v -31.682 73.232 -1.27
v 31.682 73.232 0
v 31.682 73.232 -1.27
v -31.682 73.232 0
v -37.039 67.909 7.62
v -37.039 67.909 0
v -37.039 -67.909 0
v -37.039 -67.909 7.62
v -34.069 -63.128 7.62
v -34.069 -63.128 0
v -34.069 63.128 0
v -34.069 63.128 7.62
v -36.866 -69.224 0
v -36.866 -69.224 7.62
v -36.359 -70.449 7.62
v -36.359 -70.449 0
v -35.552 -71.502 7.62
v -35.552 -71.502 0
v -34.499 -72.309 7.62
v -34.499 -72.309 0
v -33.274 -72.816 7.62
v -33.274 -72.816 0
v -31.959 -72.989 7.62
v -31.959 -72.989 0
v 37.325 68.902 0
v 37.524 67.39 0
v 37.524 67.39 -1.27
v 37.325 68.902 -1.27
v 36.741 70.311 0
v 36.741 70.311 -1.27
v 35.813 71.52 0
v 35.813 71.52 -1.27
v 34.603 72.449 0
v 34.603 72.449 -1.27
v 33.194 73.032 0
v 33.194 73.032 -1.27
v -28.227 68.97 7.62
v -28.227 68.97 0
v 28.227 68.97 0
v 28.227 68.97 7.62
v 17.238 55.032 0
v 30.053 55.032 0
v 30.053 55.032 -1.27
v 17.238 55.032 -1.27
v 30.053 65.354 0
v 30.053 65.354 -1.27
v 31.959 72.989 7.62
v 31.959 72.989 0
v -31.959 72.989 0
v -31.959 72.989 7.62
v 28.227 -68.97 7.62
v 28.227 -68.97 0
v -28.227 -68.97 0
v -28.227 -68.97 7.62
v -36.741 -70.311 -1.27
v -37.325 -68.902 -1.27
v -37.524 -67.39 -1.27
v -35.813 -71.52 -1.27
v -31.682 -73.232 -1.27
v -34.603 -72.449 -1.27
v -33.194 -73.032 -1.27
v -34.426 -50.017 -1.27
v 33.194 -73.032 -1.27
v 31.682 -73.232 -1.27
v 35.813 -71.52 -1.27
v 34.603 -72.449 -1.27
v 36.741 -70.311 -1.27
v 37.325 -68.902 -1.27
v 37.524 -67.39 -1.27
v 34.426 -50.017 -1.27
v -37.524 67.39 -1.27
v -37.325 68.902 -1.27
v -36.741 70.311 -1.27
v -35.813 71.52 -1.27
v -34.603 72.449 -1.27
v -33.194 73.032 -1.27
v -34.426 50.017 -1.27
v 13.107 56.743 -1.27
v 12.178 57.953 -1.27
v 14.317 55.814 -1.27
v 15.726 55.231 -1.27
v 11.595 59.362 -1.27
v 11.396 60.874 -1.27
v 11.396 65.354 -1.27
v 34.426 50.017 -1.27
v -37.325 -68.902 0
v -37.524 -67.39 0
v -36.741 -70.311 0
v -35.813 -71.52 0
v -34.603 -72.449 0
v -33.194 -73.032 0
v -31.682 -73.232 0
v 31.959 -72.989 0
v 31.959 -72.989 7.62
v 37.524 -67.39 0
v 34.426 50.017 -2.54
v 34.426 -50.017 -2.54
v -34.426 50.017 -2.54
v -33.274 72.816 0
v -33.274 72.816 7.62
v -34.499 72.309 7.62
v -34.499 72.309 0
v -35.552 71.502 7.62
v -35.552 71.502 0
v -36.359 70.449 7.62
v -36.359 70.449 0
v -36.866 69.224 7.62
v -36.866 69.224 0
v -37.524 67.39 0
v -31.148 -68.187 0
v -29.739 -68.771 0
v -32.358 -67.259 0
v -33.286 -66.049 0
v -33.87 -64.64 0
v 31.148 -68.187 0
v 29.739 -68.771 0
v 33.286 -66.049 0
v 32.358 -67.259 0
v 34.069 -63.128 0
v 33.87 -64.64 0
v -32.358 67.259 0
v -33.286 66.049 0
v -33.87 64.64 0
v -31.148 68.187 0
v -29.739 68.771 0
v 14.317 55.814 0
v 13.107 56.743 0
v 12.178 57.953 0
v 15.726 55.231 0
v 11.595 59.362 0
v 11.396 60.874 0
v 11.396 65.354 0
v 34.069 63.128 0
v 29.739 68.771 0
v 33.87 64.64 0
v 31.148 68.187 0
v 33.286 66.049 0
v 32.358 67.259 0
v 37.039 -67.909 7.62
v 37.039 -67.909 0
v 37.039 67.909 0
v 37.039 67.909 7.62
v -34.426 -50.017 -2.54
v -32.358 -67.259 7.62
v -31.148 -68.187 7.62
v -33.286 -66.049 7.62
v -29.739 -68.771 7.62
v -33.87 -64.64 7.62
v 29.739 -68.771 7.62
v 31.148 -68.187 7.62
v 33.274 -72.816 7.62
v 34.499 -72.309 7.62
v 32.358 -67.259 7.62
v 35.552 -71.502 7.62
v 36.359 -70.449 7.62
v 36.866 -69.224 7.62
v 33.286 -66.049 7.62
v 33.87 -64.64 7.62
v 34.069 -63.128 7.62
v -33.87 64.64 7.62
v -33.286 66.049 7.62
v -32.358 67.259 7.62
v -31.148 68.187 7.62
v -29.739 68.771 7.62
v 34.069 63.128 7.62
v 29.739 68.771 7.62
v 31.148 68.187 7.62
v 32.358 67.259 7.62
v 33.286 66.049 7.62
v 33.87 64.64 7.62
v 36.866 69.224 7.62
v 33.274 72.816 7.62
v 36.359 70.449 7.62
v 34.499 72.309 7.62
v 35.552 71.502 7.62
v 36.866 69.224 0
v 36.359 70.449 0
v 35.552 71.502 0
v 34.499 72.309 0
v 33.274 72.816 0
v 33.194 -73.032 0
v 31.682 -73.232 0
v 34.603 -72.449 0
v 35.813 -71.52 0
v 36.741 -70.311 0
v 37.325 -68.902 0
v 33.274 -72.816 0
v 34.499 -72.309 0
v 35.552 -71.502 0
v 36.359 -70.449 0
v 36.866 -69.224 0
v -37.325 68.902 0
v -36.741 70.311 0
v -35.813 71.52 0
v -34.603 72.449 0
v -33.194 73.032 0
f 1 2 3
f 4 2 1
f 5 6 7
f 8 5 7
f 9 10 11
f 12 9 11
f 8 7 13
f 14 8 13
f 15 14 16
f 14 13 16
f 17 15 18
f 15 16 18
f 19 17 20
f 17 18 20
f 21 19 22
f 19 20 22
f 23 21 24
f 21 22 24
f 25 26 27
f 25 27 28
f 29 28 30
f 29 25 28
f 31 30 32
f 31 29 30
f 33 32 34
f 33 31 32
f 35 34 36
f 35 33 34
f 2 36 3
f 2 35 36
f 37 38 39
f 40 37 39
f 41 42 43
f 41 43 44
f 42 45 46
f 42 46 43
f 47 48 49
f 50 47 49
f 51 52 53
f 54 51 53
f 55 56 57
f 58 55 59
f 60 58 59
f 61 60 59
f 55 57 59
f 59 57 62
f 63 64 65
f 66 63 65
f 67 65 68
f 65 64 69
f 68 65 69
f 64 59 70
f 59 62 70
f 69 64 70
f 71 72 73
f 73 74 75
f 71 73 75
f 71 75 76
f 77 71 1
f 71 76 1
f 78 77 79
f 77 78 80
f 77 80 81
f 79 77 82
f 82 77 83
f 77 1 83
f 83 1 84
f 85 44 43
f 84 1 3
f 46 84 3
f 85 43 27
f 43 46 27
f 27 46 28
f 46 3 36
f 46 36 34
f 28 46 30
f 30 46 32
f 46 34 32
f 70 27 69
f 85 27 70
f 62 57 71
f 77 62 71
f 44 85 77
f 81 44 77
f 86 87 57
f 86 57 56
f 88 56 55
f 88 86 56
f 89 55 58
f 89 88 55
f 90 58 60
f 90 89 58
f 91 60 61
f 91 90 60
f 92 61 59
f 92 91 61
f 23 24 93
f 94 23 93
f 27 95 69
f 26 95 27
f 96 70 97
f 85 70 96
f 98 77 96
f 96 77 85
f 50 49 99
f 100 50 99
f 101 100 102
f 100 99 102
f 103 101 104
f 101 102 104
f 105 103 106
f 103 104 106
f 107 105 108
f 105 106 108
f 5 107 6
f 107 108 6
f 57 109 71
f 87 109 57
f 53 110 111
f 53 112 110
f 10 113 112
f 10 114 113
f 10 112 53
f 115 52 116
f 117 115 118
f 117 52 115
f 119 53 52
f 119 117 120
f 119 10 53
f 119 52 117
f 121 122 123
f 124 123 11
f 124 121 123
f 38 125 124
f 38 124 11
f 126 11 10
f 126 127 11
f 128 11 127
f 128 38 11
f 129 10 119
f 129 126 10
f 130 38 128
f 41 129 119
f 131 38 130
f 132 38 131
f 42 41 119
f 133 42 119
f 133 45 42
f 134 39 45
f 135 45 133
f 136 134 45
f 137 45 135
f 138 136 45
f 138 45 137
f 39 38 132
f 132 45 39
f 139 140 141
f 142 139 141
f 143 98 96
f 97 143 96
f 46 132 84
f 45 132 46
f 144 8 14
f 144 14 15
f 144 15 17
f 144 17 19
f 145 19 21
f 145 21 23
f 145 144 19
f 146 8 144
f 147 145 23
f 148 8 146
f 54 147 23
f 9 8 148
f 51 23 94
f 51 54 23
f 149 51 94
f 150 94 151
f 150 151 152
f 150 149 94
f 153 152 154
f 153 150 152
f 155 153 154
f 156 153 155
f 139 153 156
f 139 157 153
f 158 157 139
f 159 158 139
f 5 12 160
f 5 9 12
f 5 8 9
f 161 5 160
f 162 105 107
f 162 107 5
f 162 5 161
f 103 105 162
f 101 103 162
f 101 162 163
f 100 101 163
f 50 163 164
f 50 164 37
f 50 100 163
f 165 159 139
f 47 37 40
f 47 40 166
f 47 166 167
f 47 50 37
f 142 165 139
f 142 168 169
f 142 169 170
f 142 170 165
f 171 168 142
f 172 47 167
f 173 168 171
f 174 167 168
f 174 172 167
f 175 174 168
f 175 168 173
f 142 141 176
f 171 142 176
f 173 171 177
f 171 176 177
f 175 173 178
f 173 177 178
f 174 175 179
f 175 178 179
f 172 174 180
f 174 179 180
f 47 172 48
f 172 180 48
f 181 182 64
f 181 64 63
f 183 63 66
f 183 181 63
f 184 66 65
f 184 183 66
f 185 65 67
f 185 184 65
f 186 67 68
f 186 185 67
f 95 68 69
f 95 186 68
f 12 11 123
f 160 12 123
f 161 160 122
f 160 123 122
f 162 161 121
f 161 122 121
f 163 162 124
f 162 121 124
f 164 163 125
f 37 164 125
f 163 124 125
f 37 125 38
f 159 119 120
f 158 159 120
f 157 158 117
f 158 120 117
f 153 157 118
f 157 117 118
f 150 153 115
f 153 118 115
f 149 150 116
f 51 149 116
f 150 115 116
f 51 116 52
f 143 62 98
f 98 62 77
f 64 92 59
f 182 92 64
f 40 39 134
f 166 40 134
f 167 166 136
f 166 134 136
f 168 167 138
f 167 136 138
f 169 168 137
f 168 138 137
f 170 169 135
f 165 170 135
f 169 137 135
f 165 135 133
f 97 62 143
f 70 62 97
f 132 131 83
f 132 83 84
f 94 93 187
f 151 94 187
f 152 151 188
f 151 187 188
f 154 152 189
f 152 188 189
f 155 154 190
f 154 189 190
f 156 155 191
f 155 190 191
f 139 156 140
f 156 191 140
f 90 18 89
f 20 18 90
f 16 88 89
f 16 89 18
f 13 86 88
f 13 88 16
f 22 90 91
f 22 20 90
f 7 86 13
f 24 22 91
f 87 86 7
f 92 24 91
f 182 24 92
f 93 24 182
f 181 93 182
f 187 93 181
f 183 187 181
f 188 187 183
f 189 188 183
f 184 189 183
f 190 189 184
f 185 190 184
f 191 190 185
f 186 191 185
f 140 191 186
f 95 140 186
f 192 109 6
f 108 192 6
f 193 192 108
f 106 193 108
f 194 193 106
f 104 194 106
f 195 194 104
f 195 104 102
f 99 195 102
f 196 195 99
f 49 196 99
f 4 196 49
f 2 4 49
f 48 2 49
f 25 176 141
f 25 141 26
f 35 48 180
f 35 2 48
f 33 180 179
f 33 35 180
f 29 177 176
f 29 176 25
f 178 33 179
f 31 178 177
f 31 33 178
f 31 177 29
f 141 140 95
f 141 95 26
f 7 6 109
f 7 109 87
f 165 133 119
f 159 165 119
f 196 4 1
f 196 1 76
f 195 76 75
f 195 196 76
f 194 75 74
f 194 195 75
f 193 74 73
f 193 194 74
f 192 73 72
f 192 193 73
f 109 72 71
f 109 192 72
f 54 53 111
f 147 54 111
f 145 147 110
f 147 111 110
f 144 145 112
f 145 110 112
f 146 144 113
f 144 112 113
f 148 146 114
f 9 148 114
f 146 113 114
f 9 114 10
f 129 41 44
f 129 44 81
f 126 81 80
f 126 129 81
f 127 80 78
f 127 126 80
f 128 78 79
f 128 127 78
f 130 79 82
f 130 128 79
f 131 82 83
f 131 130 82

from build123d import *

# Parameters (mm, degrees)
F1_W     = 68.8515231013
F1_H     = 100.0347808003
F2_DEPTH = 1.27
F3_DEPTH = 7.62
F4_DEPTH = 2.54


with BuildPart() as f2:
    # F1 (on Top) → F2 (new body)
    with BuildSketch(Plane.XY):
        with BuildLine():
            ThreePointArc((-37.5236049294, -67.3895406203), (-35.8125227451, -71.520458436), (-31.6816049294, -73.2315406203))
            Line((-31.6816049294, -73.2315406203), (31.6816049294, -73.2315406203))
            ThreePointArc((31.6816049294, -73.2315406203), (35.8125227451, -71.520458436), (37.5236049294, -67.3895406203))
            Line((37.5236049294, -67.3895406203), (37.5236049294, 67.3895406203))
            ThreePointArc((37.5236049294, 67.3895406203), (35.8125227451, 71.520458436), (31.6816049294, 73.2315406203))
            Line((31.6816049294, 73.2315406203), (-31.6816049294, 73.2315406203))
            ThreePointArc((-31.6816049294, 73.2315406203), (-35.8125227451, 71.520458436), (-37.5236049294, 67.3895406203))
            Line((-37.5236049294, 67.3895406203), (-37.5236049294, -67.3895406203))
        make_face()
        Rectangle(F1_W, F1_H, mode=Mode.SUBTRACT)
        with BuildLine():
            Line((11.3956173882, 65.3541386127), (30.0525762141, 65.3541386127))
            Line((30.0525762141, 65.3541386127), (30.0525762141, 55.0315789878))
            Line((30.0525762141, 55.0315789878), (17.2376173882, 55.0315789878))
            ThreePointArc((17.2376173882, 55.0315789878), (13.1066995725, 56.7426611721), (11.3956173882, 60.8735789878))
            Line((11.3956173882, 60.8735789878), (11.3956173882, 65.3541386127))
        make_face(mode=Mode.SUBTRACT)
    extrude(amount=-F2_DEPTH)

    # F0 (on Top) → F3 (join)
    with BuildSketch(Plane.XY):
        with BuildLine():
            Line((31.9594252241, 72.9894563556), (-31.9594252241, 72.9894563556))
            ThreePointArc((-31.9594252241, 72.9894563556), (-35.5515276725, 71.501558804), (-37.0394252241, 67.9094563556))
            Line((-37.0394252241, 67.9094563556), (-37.0394252241, -67.9094563556))
            ThreePointArc((-37.0394252241, -67.9094563556), (-35.5515276725, -71.501558804), (-31.9594252241, -72.9894563556))
            Line((-31.9594252241, -72.9894563556), (31.9594252241, -72.9894563556))
            ThreePointArc((31.9594252241, -72.9894563556), (35.5515276725, -71.501558804), (37.0394252241, -67.9094563556))
            Line((37.0394252241, -67.9094563556), (37.0394252241, 67.9094563556))
            ThreePointArc((37.0394252241, 67.9094563556), (35.5515276725, 71.501558804), (31.9594252241, 72.9894563556))
        make_face()
        with BuildLine():
            Line((-28.2269942241, 68.9697414637), (28.2269942241, 68.9697414637))
            ThreePointArc((28.2269942241, 68.9697414637), (32.3579120398, 67.2586592794), (34.0689942241, 63.1277414637))
            Line((34.0689942241, 63.1277414637), (34.0689942241, -63.1277414637))
            ThreePointArc((34.0689942241, -63.1277414637), (32.3579120398, -67.2586592794), (28.2269942241, -68.9697414637))
            Line((28.2269942241, -68.9697414637), (-28.2269942241, -68.9697414637))
            ThreePointArc((-28.2269942241, -68.9697414637), (-32.3579120398, -67.2586592794), (-34.0689942241, -63.1277414637))
            Line((-34.0689942241, -63.1277414637), (-34.0689942241, 63.1277414637))
            ThreePointArc((-34.0689942241, 63.1277414637), (-32.3579120398, 67.2586592794), (-28.2269942241, 68.9697414637))
        make_face(mode=Mode.SUBTRACT)
    extrude(amount=F3_DEPTH)

    # F1 (on Top) → F4 (join)
    with BuildSketch(Plane.XY):
        Rectangle(F1_W, F1_H)
    extrude(amount=-F4_DEPTH)


solid = f2.part
